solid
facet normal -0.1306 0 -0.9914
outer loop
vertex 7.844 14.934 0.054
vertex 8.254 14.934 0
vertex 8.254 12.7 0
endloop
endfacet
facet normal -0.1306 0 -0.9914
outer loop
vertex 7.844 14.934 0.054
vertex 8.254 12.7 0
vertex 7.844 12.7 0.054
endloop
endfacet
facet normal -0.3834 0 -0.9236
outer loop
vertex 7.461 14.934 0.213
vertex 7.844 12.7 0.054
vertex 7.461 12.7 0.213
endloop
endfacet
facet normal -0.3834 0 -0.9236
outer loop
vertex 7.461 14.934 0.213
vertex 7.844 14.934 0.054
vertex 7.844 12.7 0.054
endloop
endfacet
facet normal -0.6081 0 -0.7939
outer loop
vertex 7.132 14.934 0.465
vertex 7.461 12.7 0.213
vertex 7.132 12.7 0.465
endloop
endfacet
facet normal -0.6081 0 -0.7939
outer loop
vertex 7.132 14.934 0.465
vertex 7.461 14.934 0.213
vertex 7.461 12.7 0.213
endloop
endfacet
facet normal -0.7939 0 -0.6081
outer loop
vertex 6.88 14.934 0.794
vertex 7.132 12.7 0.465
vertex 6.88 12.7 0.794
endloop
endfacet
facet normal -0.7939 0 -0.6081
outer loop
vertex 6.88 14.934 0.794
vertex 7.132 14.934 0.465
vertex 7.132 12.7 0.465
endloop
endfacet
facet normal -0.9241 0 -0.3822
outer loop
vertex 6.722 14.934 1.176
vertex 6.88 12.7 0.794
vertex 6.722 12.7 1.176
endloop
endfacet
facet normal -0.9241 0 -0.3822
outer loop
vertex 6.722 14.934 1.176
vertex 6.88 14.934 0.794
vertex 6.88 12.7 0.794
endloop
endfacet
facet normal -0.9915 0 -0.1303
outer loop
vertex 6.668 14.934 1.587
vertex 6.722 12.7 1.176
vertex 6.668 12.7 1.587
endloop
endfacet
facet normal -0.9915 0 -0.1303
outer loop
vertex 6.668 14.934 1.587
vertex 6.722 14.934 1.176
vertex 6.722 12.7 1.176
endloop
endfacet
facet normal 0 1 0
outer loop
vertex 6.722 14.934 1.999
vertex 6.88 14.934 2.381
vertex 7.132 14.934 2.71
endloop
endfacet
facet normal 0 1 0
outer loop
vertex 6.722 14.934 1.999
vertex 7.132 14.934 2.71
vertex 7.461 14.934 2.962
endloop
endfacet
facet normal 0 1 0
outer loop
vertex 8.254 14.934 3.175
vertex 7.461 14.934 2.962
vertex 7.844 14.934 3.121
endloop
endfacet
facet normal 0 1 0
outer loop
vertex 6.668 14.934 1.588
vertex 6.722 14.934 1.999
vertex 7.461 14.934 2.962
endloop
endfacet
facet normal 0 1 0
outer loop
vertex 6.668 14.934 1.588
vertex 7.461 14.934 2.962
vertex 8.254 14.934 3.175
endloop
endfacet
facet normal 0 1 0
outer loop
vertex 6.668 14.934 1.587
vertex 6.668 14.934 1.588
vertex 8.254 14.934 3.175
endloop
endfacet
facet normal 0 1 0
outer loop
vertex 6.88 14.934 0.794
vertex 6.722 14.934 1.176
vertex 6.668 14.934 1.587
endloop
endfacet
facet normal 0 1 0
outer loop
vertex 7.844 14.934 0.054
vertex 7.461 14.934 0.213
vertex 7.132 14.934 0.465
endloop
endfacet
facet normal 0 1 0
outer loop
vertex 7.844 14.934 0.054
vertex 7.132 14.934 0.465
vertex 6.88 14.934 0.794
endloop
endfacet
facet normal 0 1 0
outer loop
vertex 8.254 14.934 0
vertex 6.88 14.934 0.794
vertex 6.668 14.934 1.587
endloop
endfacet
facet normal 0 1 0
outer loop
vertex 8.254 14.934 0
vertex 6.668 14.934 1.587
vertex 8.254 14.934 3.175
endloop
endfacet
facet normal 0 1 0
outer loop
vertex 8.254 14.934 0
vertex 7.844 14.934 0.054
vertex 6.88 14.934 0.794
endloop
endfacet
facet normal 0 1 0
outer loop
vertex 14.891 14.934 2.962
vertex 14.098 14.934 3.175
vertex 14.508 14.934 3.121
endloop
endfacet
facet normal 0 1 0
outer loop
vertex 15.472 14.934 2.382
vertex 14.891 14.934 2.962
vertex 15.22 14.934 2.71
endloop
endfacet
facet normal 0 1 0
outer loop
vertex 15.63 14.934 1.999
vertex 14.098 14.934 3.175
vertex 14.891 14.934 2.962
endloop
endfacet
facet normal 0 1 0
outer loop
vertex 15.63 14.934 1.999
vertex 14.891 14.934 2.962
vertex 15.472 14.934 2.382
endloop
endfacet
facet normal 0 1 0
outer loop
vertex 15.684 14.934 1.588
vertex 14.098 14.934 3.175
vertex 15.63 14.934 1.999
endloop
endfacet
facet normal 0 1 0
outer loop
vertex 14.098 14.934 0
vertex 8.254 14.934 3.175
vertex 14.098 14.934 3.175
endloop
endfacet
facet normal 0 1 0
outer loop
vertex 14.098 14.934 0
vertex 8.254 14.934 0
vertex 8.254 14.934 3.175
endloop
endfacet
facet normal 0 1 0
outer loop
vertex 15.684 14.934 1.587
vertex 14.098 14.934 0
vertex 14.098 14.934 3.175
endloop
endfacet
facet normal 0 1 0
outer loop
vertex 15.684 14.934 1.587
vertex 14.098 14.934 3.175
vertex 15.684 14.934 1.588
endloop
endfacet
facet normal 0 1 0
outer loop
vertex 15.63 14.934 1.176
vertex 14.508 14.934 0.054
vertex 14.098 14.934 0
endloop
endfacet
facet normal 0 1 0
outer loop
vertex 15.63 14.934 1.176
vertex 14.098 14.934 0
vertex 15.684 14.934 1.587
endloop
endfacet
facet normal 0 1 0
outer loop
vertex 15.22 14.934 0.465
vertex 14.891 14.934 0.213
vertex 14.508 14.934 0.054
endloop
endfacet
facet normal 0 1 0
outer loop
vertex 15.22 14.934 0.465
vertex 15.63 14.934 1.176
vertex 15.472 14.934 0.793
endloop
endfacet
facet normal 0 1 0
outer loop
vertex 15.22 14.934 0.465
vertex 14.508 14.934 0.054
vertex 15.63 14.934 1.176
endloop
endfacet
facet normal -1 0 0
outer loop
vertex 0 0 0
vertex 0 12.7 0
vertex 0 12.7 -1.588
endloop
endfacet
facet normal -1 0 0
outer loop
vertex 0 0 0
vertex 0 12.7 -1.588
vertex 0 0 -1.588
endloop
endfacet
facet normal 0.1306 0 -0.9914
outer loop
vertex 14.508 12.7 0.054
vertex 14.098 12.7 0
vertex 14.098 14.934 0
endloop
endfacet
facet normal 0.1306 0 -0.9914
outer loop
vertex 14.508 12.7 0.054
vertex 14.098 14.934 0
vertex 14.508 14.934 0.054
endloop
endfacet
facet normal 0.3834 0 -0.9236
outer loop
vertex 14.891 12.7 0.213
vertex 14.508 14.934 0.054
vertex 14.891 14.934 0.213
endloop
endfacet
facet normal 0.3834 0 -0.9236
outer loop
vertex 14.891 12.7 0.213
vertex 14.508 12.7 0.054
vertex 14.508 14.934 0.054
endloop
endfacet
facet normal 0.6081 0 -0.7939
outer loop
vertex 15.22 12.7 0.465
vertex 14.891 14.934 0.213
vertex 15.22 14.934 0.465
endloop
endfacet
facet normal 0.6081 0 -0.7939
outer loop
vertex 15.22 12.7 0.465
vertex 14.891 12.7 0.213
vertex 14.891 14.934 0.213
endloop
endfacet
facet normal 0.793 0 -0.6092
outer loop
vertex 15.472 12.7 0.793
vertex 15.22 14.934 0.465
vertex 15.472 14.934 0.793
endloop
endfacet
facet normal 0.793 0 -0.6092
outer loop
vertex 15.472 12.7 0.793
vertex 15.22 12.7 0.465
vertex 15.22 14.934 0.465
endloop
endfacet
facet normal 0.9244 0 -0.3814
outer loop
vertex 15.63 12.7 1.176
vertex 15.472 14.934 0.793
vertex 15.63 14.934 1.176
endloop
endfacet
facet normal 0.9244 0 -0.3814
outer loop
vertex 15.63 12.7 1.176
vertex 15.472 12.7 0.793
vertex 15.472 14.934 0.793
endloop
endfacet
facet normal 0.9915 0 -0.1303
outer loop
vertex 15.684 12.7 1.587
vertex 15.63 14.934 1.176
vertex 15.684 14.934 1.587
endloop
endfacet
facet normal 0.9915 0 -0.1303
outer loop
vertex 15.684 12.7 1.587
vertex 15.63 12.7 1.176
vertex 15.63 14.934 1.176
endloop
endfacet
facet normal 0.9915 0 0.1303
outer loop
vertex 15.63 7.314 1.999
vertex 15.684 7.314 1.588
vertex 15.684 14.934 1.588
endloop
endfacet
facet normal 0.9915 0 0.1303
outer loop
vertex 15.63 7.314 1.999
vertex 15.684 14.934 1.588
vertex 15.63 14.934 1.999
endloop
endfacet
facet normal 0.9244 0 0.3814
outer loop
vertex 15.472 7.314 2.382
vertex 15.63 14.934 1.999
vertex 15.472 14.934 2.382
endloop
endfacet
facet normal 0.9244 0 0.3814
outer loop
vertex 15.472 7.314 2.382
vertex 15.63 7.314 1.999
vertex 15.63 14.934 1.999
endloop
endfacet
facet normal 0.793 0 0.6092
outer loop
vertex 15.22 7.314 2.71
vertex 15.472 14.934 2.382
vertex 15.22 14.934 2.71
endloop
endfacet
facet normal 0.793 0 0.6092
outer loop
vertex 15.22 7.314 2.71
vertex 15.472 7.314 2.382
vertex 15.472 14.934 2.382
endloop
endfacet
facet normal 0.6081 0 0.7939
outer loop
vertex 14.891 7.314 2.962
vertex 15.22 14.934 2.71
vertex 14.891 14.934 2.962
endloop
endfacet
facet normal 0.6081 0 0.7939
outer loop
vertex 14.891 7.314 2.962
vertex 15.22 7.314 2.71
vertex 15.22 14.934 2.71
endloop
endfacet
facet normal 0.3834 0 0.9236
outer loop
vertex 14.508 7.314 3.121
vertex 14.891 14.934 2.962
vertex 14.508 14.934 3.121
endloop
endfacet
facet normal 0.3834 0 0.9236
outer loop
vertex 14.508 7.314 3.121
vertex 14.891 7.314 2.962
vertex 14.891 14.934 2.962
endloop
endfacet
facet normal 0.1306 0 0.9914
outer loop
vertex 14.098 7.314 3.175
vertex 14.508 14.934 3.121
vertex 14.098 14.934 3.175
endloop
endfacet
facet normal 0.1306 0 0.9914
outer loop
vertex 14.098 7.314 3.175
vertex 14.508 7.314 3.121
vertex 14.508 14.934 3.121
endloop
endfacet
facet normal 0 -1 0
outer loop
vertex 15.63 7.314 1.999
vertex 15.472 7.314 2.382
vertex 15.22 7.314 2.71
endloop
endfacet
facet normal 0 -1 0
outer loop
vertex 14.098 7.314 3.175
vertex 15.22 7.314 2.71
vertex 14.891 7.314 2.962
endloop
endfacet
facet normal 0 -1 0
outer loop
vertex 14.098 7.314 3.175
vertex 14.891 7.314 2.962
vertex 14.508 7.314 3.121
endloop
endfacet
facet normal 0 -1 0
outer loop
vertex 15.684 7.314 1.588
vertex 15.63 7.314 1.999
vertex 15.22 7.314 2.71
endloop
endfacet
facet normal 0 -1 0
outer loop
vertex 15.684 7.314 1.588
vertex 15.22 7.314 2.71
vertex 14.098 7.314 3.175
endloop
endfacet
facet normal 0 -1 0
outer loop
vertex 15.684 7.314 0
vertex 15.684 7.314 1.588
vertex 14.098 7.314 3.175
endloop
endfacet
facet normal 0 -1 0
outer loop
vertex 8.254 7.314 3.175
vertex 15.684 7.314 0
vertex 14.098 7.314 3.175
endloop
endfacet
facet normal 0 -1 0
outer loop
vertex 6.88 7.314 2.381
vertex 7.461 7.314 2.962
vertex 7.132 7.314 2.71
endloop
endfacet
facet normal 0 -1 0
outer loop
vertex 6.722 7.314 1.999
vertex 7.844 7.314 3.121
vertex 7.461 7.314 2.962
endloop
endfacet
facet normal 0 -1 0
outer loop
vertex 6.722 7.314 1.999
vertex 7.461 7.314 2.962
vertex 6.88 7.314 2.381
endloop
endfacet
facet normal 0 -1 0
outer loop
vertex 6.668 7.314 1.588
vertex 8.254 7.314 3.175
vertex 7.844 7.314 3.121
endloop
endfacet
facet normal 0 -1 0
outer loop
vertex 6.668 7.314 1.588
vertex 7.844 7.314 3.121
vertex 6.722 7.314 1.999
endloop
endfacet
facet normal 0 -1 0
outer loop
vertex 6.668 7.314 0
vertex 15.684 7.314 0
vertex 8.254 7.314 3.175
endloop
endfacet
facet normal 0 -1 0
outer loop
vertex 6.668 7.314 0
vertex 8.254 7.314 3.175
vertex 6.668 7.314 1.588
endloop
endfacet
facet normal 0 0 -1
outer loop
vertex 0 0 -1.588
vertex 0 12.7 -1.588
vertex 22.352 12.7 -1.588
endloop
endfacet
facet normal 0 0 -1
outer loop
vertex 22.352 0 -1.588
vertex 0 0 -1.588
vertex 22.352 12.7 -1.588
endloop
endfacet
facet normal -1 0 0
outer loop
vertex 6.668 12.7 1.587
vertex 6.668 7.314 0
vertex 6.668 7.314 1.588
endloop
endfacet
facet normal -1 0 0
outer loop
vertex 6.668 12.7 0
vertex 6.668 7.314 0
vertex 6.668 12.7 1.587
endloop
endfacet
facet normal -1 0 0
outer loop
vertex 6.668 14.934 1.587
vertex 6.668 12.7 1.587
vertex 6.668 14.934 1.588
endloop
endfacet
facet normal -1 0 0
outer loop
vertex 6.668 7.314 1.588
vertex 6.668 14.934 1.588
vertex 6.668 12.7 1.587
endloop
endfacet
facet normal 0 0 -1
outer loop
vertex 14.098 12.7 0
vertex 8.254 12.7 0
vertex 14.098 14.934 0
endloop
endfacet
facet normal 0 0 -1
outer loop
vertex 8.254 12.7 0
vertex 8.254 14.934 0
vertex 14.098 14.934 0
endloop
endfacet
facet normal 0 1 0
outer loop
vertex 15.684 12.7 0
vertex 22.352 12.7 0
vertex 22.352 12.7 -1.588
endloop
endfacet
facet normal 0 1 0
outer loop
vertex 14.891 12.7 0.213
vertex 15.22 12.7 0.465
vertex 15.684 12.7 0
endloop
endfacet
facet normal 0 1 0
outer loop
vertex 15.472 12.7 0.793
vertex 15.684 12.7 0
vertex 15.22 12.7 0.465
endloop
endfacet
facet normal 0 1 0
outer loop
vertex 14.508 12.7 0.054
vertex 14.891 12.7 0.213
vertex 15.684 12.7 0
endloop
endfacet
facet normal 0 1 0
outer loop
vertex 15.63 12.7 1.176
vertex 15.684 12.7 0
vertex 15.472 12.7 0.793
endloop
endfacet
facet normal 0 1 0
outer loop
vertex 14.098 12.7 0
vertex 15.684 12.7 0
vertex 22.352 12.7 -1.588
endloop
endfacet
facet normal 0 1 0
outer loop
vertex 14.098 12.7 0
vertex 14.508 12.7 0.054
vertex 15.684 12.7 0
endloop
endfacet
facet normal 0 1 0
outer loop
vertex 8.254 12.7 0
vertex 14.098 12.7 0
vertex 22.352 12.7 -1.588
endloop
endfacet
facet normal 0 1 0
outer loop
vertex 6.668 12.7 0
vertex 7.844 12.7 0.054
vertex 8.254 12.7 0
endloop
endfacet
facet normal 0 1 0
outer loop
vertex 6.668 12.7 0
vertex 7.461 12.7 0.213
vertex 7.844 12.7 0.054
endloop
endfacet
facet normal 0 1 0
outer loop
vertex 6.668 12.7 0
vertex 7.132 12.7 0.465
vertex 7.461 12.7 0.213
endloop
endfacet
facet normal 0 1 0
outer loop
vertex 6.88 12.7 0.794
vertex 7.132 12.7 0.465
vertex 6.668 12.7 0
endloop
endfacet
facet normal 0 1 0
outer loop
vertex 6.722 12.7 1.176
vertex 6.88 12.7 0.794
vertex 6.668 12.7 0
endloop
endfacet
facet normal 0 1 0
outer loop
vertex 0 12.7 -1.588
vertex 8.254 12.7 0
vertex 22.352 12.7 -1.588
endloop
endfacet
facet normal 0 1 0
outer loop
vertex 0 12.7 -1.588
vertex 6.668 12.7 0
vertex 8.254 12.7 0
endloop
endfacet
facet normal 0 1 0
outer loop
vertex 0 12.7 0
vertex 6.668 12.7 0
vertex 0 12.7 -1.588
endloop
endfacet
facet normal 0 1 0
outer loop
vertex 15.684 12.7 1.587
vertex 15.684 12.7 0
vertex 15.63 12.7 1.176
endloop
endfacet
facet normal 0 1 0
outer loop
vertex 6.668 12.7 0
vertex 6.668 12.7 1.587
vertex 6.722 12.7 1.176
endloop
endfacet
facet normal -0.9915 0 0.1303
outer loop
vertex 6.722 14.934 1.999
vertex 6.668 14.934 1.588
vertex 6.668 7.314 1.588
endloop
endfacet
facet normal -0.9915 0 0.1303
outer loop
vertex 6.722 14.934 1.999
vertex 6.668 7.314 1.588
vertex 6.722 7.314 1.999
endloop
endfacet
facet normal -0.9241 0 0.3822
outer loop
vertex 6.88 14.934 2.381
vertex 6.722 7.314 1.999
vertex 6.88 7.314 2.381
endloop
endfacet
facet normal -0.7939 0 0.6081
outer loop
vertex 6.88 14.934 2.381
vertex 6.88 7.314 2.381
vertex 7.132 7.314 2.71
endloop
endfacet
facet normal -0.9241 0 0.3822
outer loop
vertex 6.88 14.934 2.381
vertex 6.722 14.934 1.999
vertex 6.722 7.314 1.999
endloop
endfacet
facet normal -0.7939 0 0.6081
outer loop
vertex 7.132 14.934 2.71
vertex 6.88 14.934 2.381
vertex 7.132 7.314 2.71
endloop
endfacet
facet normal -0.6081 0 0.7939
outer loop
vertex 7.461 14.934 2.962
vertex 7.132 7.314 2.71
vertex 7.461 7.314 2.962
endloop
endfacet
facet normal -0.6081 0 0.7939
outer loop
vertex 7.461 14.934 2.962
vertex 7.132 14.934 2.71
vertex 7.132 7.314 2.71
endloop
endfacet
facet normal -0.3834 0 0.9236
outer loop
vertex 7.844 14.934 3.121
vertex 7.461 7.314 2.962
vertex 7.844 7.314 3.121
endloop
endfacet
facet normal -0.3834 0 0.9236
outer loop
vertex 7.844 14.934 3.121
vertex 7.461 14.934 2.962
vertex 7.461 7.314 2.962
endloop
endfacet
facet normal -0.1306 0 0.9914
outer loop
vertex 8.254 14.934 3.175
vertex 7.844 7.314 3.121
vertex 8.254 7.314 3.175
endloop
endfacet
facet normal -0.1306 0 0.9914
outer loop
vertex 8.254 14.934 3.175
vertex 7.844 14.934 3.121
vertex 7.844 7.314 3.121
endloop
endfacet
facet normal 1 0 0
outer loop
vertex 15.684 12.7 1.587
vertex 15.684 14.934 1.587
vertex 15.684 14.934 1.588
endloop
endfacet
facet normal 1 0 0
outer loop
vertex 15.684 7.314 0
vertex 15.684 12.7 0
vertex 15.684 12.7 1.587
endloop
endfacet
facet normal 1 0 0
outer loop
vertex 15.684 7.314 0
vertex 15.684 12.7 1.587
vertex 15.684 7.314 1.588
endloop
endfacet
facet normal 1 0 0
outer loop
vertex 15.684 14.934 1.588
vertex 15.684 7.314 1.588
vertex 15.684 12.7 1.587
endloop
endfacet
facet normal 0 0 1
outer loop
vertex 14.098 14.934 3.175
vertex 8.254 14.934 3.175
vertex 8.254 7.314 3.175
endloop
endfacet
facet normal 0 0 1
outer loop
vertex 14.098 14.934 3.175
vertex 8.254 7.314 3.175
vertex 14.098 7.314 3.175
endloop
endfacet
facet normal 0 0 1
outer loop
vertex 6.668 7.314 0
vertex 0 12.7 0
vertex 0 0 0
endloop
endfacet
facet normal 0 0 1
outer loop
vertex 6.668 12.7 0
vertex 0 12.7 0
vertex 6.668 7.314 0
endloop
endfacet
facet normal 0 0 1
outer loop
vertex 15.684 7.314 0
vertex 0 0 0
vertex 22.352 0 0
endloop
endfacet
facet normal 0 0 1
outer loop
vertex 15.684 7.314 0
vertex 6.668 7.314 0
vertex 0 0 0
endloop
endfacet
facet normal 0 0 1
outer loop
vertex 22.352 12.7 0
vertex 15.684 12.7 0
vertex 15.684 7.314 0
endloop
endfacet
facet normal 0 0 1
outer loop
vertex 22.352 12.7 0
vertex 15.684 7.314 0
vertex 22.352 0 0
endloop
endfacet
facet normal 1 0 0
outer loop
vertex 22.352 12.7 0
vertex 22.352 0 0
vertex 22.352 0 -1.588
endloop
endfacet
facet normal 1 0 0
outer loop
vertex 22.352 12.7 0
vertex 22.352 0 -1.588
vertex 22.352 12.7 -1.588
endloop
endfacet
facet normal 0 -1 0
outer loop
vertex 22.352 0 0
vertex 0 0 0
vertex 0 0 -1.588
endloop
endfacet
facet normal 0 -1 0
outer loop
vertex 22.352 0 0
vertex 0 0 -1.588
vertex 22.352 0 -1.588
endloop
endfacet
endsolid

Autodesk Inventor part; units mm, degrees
ref_plane "YZ Plane" through (0, 0, 0) normal (1, 0, 0) x (0, 1, 0)
ref_plane "XZ Plane" through (0, 0, 0) normal (0, 1, 0) x (-1, 0, 0)
ref_plane "XY Plane" through (0, 0, 0) normal (0, 0, 1) x (1, 0, 0)
sketch "Sketch1" plane through (0, 0, 0) normal (0, 0, 1) x (1, 0, 0)
  line L0 (0, 0) -> (22.352, 0)
  line L1 (22.352, 0) -> (22.352, 12.7)
  line L2 (22.352, 12.7) -> (0, 12.7)
  line L3 (0, 12.7) -> (0, 0)
  dimension "d0" = 22.352
  dimension "d1" = 12.7
extrude "Extrusion1" add sketch "Sketch1" against normal blind 1.5875
sketch "Sketch2" plane through (0, 0, 0) normal (0, 0, 1) x (1, 0, 0)
  line L0 (22.352, 0) -> (22.352, 12.7) projected
  line L1 (6.6675, 14.9342) -> (15.6845, 14.9342)
  line L2 (15.6845, 14.9342) -> (15.6845, 7.3142)
  line L3 (15.6845, 7.3142) -> (6.6675, 7.3142)
  line L4 (6.6675, 7.3142) -> (6.6675, 14.9342)
  dimension "d8" = 9.017
  dimension "d9" = 7.62
  dimension "d10" = 6.6675
extrude "Extrusion2" add sketch "Sketch2" along normal blind 3.175
fillet "Fillet1" radius 1.5875 4 edges at (15.6845, 11.1242, 3.175) (15.6845, 13.8171, 0) (6.6675, 11.1242, 3.175) (6.6675, 13.8171, 0)
properties part number "‎BOB-15100‎ USB C Breakout" material "PBT Plastic"
